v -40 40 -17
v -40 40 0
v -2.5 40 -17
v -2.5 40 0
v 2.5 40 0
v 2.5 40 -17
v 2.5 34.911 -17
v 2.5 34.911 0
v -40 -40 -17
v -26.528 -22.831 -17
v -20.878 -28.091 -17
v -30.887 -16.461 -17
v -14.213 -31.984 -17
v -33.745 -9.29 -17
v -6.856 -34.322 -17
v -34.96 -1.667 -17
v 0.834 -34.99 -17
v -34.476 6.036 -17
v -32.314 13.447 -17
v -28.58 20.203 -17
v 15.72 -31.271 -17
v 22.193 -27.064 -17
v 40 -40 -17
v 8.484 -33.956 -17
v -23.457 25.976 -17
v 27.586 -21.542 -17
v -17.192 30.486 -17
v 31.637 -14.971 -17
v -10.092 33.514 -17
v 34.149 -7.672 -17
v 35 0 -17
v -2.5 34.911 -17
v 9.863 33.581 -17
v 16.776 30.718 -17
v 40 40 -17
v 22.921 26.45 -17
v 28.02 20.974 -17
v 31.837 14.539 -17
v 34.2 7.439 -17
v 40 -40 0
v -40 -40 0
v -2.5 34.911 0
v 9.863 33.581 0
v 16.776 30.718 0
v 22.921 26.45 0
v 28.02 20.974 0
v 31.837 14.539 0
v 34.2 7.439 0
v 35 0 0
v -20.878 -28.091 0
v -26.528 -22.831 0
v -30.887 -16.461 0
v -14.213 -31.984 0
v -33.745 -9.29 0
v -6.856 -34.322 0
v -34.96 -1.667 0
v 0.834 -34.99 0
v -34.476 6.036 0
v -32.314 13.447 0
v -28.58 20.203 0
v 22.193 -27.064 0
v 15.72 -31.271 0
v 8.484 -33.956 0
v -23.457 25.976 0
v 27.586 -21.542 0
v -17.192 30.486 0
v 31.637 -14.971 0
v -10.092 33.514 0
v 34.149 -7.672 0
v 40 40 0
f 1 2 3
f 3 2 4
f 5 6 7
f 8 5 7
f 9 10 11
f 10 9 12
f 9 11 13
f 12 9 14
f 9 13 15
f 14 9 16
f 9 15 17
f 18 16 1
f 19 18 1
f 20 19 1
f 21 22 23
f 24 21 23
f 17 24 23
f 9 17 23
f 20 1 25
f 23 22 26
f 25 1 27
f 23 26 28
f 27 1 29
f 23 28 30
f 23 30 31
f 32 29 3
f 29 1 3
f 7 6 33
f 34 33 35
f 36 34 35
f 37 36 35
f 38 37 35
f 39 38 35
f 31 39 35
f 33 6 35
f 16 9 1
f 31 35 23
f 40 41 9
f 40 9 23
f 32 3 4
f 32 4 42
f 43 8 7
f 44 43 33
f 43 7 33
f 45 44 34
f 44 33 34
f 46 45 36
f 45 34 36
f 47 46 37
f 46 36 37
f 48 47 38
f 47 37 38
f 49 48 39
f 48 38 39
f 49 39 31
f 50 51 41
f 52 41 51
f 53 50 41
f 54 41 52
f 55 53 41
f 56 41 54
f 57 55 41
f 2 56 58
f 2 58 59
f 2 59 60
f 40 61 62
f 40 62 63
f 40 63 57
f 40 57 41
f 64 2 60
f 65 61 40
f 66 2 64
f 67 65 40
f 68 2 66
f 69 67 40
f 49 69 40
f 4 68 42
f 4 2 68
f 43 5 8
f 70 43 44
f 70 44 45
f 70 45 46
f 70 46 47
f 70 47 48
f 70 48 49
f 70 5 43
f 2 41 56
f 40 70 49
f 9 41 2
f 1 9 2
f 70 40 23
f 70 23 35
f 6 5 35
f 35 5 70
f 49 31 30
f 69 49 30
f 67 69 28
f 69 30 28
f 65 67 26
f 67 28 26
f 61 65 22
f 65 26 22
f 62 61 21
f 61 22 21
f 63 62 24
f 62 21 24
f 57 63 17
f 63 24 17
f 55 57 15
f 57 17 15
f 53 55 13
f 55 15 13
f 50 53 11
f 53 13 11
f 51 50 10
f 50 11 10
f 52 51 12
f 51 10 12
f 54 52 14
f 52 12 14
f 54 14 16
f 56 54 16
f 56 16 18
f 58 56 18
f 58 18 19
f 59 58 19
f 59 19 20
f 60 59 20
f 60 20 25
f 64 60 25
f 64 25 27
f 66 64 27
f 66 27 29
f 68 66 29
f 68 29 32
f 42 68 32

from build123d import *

# Parameters (mm, degrees)
SKETCH040_W     = 80
SKETCH040_H     = 80
PAD013_DEPTH    = 17
SKETCH041_R     = 35
POCKET014_DEPTH = 20
SKETCH044_W     = 5
SKETCH044_H     = 20.180618
POCKET017_DEPTH = 24


with BuildPart() as part:
    # Sketch040 → Pad013 (new body)
    with BuildSketch(Plane.XY):
        Rectangle(SKETCH040_W, SKETCH040_H)
    extrude(amount=-PAD013_DEPTH)

    # Sketch041 (on Face6 of Pad013) → Pocket014 (cut)
    with BuildSketch(Plane(origin=(0, 0, -17), x_dir=(1, 0, 0), z_dir=(0, 0, -1))):
        Circle(SKETCH041_R)
    extrude(amount=-POCKET014_DEPTH, mode=Mode.SUBTRACT)

    # Sketch044 (on Face5 of Pocket014) → Pocket017 (cut)
    with BuildSketch(Plane(origin=(0, 0, -17), x_dir=(1, 0, 0), z_dir=(0, 0, -1))):
        with Locations((0, -41.150577)):
            Rectangle(SKETCH044_W, SKETCH044_H)
    extrude(amount=-POCKET017_DEPTH, mode=Mode.SUBTRACT)


solid = part.part
